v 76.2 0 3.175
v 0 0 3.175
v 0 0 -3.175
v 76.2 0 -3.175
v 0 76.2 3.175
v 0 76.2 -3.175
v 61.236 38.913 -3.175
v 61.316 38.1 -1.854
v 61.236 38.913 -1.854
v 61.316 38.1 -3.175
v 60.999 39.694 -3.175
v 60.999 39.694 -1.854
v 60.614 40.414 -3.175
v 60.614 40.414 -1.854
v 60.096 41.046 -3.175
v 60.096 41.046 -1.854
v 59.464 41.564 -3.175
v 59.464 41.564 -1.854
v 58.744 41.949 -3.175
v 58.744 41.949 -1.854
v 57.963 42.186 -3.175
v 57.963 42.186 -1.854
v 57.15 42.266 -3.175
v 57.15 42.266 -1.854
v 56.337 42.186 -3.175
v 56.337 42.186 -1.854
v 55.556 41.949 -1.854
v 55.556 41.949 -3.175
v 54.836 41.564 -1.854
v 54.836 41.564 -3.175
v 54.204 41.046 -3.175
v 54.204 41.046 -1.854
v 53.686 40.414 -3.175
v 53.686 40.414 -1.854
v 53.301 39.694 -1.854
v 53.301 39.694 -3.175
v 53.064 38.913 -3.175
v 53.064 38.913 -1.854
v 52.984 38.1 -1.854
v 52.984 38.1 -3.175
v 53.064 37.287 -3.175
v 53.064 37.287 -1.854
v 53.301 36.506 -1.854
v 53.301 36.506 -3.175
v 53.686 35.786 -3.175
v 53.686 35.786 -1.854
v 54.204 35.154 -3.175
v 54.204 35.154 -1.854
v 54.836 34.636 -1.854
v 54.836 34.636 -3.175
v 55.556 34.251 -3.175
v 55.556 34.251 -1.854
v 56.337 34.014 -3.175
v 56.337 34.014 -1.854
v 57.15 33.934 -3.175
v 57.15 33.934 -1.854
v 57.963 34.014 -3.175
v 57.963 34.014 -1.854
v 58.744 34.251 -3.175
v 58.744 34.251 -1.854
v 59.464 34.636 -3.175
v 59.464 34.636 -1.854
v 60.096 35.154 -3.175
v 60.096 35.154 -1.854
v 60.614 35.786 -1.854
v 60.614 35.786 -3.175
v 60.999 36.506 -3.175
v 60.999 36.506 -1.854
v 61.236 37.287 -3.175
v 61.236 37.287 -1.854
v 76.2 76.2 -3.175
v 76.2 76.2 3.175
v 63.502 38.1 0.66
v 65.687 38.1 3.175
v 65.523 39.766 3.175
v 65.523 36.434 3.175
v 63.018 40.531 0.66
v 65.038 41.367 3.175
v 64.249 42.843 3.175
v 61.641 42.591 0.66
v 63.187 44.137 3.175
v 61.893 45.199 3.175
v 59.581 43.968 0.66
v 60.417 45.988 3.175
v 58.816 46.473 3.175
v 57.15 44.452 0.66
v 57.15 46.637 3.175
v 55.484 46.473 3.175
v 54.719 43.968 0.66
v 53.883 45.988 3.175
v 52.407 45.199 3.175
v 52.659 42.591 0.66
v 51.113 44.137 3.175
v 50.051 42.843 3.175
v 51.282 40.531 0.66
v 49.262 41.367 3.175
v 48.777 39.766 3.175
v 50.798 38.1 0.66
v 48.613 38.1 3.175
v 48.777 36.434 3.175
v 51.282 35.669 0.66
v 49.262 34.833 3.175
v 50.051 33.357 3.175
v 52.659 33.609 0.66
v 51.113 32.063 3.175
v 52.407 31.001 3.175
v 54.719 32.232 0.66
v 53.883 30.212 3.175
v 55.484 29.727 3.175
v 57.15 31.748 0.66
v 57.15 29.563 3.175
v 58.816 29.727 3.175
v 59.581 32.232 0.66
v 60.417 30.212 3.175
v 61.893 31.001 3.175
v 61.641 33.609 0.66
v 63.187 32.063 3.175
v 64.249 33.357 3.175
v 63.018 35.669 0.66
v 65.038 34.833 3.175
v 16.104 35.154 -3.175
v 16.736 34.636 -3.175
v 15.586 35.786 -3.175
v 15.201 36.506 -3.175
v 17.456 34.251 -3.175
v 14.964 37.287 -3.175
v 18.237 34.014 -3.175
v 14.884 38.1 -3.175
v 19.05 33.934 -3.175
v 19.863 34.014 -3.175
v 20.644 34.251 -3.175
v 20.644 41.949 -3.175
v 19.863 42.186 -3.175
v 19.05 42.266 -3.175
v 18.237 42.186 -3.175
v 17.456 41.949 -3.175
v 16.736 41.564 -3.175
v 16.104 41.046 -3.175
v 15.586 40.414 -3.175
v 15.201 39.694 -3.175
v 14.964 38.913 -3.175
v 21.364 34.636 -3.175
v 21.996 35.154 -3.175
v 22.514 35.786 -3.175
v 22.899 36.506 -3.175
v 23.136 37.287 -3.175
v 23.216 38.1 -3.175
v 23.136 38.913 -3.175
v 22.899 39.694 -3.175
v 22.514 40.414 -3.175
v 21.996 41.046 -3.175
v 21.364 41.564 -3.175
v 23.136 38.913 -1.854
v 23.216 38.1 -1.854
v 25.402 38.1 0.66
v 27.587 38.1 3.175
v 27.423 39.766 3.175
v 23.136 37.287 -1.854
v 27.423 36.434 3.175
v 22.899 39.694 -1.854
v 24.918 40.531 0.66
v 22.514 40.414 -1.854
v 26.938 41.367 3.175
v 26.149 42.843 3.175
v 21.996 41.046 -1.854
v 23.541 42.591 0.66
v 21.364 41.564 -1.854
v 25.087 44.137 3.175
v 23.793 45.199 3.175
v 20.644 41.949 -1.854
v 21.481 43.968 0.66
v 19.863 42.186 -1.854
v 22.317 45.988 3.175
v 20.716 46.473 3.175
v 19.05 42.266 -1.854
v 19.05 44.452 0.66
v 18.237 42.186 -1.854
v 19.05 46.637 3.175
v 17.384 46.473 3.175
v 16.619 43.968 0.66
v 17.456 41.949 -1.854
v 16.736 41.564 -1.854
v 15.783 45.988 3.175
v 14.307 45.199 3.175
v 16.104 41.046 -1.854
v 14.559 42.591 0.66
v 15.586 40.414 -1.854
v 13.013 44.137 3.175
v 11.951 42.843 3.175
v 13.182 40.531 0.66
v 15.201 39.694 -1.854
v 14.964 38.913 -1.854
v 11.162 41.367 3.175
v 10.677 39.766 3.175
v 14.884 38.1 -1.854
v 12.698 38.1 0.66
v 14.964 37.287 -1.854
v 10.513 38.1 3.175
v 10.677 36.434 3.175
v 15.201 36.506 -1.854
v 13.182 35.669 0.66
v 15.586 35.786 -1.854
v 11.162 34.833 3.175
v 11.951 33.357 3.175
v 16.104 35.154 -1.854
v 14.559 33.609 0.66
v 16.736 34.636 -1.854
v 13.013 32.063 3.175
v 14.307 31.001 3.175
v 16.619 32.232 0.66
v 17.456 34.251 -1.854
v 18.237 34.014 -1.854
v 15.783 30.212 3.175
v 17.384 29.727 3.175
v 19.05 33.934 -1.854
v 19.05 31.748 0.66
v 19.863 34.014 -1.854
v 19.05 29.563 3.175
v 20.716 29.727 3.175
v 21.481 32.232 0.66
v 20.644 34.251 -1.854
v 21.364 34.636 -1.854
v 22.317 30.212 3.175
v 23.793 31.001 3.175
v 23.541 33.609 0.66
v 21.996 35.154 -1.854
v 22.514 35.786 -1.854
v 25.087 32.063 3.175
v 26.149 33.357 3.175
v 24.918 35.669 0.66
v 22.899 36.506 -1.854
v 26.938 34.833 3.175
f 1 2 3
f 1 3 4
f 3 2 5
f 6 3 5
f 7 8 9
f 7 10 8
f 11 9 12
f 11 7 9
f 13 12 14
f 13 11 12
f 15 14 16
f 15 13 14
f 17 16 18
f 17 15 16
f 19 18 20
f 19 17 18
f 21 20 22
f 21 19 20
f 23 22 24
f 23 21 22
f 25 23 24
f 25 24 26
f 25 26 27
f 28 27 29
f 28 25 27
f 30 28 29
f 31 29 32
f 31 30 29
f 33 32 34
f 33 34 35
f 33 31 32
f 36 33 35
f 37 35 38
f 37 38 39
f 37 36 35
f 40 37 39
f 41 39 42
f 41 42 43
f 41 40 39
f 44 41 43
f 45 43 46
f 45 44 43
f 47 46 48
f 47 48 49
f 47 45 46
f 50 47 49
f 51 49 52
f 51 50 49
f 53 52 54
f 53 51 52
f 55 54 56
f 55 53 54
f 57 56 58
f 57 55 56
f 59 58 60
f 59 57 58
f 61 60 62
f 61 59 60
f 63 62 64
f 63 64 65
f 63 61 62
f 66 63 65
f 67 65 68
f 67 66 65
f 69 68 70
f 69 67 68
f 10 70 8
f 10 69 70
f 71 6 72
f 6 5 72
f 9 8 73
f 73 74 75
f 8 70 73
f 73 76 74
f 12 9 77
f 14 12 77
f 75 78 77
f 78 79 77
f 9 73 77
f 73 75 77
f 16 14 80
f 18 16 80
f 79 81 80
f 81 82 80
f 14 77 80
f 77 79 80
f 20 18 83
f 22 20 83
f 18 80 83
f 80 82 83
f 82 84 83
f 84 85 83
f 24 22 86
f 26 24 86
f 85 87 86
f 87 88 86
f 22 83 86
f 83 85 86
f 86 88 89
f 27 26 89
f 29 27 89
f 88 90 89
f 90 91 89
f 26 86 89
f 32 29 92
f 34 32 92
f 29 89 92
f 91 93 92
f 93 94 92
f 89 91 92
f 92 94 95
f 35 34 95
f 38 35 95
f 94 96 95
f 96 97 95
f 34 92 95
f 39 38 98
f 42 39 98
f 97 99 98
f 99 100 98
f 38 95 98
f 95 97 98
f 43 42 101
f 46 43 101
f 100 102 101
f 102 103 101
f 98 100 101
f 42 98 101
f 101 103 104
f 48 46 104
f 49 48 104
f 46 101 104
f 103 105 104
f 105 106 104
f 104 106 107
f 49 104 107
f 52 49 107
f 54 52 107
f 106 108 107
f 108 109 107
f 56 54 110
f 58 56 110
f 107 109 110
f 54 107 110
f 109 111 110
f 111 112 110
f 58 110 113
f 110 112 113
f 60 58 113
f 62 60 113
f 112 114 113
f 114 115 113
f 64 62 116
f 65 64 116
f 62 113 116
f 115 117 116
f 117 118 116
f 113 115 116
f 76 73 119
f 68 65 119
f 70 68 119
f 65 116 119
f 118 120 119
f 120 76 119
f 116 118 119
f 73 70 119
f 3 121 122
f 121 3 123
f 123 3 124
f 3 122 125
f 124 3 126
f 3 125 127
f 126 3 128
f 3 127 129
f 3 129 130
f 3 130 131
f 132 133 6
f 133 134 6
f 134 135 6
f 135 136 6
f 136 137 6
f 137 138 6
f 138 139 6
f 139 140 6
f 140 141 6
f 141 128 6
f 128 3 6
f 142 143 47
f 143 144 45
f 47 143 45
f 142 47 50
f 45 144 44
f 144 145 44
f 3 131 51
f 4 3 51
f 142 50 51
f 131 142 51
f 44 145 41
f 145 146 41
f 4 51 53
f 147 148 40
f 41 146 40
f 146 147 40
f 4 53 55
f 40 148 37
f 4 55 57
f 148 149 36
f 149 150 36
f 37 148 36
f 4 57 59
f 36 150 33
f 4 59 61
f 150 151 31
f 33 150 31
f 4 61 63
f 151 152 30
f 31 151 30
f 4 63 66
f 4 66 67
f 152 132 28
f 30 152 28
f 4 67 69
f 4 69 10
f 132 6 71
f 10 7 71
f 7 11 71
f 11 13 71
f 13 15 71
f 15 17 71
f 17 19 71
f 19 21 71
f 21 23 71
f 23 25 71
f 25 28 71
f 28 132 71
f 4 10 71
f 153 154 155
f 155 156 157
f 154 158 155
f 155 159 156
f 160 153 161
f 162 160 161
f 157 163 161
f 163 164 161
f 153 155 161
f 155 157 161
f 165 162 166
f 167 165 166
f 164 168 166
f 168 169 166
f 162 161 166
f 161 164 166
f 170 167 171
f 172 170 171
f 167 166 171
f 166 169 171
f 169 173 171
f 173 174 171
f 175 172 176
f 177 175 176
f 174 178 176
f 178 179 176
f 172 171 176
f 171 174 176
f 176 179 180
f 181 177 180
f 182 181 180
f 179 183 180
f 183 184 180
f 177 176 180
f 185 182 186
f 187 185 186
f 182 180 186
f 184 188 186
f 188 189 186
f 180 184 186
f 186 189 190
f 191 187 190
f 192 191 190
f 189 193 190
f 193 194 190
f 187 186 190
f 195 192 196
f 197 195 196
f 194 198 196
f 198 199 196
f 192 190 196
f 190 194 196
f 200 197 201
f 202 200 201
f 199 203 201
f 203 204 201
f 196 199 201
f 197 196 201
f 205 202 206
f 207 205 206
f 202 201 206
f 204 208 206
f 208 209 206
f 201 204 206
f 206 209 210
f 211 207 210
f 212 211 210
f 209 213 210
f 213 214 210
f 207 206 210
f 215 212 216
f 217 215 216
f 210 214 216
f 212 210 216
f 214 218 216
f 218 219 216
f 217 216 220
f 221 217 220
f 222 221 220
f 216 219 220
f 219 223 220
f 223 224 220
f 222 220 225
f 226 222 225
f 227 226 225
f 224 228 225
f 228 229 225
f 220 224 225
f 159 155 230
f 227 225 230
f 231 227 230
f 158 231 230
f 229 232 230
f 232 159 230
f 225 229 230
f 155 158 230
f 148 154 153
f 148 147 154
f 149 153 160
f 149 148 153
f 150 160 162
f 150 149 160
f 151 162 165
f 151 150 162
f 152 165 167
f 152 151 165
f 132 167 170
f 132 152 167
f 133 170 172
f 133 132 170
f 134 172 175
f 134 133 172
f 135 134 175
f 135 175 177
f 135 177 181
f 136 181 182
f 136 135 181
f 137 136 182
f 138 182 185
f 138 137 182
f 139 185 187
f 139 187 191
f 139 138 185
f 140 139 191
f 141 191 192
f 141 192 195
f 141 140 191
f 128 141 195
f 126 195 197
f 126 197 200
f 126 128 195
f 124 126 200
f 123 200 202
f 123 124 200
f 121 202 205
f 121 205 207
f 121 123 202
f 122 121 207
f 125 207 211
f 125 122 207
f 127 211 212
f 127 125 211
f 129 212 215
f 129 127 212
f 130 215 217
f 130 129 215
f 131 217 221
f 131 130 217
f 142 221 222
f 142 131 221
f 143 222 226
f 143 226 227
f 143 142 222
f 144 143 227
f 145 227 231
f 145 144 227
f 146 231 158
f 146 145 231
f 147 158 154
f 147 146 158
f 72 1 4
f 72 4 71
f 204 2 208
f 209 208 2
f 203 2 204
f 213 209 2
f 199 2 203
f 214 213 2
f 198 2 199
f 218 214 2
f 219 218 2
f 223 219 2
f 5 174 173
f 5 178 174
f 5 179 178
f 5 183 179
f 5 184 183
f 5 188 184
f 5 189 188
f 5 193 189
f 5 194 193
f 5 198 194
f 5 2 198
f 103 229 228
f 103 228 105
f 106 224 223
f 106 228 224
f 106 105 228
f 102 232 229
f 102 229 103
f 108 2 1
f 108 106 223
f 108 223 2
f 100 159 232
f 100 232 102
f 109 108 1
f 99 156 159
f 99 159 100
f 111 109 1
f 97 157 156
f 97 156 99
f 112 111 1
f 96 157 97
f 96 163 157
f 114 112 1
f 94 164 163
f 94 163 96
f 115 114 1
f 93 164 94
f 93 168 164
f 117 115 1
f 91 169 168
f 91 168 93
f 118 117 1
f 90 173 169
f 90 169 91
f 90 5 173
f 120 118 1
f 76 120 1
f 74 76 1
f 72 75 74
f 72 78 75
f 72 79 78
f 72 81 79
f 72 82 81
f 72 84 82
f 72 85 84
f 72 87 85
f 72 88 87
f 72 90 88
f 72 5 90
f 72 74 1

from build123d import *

# Parameters (mm, degrees)
SKETCH1_W           = 76.2
SKETCH1_H           = 76.2
SKETCH1_R           = 4.1656
BOSS_EXTRUDE1_DEPTH = 3.175
CUT_EXTRUDE1_START  = -5.0292
SKETCH2_R           = 4.1656
CUT_EXTRUDE1_DEPTH  = 6.0292
CUT_EXTRUDE1_TAPER  = -41


with BuildPart() as part:
    # Sketch1 → Boss-Extrude1 (new body, symmetric)
    with BuildSketch(Plane.XY):
        with Locations((38.1, 38.1)):
            Rectangle(SKETCH1_W, SKETCH1_H)
        with Locations((19.05, 38.1)):
            Circle(SKETCH1_R, mode=Mode.SUBTRACT)
        with Locations((57.15, 38.1)):
            Circle(SKETCH1_R, mode=Mode.SUBTRACT)
    extrude(amount=BOSS_EXTRUDE1_DEPTH, both=True)

    # Sketch2 → Cut-Extrude1 (cut, through all)
    with BuildSketch(Plane.XY.offset(3.175).offset(CUT_EXTRUDE1_START)):
        with Locations((19.05, 38.1)):
            Circle(SKETCH2_R)
        with Locations((57.15, 38.1)):
            Circle(SKETCH2_R)
    extrude(amount=CUT_EXTRUDE1_DEPTH, taper=CUT_EXTRUDE1_TAPER, mode=Mode.SUBTRACT)


solid = part.part
